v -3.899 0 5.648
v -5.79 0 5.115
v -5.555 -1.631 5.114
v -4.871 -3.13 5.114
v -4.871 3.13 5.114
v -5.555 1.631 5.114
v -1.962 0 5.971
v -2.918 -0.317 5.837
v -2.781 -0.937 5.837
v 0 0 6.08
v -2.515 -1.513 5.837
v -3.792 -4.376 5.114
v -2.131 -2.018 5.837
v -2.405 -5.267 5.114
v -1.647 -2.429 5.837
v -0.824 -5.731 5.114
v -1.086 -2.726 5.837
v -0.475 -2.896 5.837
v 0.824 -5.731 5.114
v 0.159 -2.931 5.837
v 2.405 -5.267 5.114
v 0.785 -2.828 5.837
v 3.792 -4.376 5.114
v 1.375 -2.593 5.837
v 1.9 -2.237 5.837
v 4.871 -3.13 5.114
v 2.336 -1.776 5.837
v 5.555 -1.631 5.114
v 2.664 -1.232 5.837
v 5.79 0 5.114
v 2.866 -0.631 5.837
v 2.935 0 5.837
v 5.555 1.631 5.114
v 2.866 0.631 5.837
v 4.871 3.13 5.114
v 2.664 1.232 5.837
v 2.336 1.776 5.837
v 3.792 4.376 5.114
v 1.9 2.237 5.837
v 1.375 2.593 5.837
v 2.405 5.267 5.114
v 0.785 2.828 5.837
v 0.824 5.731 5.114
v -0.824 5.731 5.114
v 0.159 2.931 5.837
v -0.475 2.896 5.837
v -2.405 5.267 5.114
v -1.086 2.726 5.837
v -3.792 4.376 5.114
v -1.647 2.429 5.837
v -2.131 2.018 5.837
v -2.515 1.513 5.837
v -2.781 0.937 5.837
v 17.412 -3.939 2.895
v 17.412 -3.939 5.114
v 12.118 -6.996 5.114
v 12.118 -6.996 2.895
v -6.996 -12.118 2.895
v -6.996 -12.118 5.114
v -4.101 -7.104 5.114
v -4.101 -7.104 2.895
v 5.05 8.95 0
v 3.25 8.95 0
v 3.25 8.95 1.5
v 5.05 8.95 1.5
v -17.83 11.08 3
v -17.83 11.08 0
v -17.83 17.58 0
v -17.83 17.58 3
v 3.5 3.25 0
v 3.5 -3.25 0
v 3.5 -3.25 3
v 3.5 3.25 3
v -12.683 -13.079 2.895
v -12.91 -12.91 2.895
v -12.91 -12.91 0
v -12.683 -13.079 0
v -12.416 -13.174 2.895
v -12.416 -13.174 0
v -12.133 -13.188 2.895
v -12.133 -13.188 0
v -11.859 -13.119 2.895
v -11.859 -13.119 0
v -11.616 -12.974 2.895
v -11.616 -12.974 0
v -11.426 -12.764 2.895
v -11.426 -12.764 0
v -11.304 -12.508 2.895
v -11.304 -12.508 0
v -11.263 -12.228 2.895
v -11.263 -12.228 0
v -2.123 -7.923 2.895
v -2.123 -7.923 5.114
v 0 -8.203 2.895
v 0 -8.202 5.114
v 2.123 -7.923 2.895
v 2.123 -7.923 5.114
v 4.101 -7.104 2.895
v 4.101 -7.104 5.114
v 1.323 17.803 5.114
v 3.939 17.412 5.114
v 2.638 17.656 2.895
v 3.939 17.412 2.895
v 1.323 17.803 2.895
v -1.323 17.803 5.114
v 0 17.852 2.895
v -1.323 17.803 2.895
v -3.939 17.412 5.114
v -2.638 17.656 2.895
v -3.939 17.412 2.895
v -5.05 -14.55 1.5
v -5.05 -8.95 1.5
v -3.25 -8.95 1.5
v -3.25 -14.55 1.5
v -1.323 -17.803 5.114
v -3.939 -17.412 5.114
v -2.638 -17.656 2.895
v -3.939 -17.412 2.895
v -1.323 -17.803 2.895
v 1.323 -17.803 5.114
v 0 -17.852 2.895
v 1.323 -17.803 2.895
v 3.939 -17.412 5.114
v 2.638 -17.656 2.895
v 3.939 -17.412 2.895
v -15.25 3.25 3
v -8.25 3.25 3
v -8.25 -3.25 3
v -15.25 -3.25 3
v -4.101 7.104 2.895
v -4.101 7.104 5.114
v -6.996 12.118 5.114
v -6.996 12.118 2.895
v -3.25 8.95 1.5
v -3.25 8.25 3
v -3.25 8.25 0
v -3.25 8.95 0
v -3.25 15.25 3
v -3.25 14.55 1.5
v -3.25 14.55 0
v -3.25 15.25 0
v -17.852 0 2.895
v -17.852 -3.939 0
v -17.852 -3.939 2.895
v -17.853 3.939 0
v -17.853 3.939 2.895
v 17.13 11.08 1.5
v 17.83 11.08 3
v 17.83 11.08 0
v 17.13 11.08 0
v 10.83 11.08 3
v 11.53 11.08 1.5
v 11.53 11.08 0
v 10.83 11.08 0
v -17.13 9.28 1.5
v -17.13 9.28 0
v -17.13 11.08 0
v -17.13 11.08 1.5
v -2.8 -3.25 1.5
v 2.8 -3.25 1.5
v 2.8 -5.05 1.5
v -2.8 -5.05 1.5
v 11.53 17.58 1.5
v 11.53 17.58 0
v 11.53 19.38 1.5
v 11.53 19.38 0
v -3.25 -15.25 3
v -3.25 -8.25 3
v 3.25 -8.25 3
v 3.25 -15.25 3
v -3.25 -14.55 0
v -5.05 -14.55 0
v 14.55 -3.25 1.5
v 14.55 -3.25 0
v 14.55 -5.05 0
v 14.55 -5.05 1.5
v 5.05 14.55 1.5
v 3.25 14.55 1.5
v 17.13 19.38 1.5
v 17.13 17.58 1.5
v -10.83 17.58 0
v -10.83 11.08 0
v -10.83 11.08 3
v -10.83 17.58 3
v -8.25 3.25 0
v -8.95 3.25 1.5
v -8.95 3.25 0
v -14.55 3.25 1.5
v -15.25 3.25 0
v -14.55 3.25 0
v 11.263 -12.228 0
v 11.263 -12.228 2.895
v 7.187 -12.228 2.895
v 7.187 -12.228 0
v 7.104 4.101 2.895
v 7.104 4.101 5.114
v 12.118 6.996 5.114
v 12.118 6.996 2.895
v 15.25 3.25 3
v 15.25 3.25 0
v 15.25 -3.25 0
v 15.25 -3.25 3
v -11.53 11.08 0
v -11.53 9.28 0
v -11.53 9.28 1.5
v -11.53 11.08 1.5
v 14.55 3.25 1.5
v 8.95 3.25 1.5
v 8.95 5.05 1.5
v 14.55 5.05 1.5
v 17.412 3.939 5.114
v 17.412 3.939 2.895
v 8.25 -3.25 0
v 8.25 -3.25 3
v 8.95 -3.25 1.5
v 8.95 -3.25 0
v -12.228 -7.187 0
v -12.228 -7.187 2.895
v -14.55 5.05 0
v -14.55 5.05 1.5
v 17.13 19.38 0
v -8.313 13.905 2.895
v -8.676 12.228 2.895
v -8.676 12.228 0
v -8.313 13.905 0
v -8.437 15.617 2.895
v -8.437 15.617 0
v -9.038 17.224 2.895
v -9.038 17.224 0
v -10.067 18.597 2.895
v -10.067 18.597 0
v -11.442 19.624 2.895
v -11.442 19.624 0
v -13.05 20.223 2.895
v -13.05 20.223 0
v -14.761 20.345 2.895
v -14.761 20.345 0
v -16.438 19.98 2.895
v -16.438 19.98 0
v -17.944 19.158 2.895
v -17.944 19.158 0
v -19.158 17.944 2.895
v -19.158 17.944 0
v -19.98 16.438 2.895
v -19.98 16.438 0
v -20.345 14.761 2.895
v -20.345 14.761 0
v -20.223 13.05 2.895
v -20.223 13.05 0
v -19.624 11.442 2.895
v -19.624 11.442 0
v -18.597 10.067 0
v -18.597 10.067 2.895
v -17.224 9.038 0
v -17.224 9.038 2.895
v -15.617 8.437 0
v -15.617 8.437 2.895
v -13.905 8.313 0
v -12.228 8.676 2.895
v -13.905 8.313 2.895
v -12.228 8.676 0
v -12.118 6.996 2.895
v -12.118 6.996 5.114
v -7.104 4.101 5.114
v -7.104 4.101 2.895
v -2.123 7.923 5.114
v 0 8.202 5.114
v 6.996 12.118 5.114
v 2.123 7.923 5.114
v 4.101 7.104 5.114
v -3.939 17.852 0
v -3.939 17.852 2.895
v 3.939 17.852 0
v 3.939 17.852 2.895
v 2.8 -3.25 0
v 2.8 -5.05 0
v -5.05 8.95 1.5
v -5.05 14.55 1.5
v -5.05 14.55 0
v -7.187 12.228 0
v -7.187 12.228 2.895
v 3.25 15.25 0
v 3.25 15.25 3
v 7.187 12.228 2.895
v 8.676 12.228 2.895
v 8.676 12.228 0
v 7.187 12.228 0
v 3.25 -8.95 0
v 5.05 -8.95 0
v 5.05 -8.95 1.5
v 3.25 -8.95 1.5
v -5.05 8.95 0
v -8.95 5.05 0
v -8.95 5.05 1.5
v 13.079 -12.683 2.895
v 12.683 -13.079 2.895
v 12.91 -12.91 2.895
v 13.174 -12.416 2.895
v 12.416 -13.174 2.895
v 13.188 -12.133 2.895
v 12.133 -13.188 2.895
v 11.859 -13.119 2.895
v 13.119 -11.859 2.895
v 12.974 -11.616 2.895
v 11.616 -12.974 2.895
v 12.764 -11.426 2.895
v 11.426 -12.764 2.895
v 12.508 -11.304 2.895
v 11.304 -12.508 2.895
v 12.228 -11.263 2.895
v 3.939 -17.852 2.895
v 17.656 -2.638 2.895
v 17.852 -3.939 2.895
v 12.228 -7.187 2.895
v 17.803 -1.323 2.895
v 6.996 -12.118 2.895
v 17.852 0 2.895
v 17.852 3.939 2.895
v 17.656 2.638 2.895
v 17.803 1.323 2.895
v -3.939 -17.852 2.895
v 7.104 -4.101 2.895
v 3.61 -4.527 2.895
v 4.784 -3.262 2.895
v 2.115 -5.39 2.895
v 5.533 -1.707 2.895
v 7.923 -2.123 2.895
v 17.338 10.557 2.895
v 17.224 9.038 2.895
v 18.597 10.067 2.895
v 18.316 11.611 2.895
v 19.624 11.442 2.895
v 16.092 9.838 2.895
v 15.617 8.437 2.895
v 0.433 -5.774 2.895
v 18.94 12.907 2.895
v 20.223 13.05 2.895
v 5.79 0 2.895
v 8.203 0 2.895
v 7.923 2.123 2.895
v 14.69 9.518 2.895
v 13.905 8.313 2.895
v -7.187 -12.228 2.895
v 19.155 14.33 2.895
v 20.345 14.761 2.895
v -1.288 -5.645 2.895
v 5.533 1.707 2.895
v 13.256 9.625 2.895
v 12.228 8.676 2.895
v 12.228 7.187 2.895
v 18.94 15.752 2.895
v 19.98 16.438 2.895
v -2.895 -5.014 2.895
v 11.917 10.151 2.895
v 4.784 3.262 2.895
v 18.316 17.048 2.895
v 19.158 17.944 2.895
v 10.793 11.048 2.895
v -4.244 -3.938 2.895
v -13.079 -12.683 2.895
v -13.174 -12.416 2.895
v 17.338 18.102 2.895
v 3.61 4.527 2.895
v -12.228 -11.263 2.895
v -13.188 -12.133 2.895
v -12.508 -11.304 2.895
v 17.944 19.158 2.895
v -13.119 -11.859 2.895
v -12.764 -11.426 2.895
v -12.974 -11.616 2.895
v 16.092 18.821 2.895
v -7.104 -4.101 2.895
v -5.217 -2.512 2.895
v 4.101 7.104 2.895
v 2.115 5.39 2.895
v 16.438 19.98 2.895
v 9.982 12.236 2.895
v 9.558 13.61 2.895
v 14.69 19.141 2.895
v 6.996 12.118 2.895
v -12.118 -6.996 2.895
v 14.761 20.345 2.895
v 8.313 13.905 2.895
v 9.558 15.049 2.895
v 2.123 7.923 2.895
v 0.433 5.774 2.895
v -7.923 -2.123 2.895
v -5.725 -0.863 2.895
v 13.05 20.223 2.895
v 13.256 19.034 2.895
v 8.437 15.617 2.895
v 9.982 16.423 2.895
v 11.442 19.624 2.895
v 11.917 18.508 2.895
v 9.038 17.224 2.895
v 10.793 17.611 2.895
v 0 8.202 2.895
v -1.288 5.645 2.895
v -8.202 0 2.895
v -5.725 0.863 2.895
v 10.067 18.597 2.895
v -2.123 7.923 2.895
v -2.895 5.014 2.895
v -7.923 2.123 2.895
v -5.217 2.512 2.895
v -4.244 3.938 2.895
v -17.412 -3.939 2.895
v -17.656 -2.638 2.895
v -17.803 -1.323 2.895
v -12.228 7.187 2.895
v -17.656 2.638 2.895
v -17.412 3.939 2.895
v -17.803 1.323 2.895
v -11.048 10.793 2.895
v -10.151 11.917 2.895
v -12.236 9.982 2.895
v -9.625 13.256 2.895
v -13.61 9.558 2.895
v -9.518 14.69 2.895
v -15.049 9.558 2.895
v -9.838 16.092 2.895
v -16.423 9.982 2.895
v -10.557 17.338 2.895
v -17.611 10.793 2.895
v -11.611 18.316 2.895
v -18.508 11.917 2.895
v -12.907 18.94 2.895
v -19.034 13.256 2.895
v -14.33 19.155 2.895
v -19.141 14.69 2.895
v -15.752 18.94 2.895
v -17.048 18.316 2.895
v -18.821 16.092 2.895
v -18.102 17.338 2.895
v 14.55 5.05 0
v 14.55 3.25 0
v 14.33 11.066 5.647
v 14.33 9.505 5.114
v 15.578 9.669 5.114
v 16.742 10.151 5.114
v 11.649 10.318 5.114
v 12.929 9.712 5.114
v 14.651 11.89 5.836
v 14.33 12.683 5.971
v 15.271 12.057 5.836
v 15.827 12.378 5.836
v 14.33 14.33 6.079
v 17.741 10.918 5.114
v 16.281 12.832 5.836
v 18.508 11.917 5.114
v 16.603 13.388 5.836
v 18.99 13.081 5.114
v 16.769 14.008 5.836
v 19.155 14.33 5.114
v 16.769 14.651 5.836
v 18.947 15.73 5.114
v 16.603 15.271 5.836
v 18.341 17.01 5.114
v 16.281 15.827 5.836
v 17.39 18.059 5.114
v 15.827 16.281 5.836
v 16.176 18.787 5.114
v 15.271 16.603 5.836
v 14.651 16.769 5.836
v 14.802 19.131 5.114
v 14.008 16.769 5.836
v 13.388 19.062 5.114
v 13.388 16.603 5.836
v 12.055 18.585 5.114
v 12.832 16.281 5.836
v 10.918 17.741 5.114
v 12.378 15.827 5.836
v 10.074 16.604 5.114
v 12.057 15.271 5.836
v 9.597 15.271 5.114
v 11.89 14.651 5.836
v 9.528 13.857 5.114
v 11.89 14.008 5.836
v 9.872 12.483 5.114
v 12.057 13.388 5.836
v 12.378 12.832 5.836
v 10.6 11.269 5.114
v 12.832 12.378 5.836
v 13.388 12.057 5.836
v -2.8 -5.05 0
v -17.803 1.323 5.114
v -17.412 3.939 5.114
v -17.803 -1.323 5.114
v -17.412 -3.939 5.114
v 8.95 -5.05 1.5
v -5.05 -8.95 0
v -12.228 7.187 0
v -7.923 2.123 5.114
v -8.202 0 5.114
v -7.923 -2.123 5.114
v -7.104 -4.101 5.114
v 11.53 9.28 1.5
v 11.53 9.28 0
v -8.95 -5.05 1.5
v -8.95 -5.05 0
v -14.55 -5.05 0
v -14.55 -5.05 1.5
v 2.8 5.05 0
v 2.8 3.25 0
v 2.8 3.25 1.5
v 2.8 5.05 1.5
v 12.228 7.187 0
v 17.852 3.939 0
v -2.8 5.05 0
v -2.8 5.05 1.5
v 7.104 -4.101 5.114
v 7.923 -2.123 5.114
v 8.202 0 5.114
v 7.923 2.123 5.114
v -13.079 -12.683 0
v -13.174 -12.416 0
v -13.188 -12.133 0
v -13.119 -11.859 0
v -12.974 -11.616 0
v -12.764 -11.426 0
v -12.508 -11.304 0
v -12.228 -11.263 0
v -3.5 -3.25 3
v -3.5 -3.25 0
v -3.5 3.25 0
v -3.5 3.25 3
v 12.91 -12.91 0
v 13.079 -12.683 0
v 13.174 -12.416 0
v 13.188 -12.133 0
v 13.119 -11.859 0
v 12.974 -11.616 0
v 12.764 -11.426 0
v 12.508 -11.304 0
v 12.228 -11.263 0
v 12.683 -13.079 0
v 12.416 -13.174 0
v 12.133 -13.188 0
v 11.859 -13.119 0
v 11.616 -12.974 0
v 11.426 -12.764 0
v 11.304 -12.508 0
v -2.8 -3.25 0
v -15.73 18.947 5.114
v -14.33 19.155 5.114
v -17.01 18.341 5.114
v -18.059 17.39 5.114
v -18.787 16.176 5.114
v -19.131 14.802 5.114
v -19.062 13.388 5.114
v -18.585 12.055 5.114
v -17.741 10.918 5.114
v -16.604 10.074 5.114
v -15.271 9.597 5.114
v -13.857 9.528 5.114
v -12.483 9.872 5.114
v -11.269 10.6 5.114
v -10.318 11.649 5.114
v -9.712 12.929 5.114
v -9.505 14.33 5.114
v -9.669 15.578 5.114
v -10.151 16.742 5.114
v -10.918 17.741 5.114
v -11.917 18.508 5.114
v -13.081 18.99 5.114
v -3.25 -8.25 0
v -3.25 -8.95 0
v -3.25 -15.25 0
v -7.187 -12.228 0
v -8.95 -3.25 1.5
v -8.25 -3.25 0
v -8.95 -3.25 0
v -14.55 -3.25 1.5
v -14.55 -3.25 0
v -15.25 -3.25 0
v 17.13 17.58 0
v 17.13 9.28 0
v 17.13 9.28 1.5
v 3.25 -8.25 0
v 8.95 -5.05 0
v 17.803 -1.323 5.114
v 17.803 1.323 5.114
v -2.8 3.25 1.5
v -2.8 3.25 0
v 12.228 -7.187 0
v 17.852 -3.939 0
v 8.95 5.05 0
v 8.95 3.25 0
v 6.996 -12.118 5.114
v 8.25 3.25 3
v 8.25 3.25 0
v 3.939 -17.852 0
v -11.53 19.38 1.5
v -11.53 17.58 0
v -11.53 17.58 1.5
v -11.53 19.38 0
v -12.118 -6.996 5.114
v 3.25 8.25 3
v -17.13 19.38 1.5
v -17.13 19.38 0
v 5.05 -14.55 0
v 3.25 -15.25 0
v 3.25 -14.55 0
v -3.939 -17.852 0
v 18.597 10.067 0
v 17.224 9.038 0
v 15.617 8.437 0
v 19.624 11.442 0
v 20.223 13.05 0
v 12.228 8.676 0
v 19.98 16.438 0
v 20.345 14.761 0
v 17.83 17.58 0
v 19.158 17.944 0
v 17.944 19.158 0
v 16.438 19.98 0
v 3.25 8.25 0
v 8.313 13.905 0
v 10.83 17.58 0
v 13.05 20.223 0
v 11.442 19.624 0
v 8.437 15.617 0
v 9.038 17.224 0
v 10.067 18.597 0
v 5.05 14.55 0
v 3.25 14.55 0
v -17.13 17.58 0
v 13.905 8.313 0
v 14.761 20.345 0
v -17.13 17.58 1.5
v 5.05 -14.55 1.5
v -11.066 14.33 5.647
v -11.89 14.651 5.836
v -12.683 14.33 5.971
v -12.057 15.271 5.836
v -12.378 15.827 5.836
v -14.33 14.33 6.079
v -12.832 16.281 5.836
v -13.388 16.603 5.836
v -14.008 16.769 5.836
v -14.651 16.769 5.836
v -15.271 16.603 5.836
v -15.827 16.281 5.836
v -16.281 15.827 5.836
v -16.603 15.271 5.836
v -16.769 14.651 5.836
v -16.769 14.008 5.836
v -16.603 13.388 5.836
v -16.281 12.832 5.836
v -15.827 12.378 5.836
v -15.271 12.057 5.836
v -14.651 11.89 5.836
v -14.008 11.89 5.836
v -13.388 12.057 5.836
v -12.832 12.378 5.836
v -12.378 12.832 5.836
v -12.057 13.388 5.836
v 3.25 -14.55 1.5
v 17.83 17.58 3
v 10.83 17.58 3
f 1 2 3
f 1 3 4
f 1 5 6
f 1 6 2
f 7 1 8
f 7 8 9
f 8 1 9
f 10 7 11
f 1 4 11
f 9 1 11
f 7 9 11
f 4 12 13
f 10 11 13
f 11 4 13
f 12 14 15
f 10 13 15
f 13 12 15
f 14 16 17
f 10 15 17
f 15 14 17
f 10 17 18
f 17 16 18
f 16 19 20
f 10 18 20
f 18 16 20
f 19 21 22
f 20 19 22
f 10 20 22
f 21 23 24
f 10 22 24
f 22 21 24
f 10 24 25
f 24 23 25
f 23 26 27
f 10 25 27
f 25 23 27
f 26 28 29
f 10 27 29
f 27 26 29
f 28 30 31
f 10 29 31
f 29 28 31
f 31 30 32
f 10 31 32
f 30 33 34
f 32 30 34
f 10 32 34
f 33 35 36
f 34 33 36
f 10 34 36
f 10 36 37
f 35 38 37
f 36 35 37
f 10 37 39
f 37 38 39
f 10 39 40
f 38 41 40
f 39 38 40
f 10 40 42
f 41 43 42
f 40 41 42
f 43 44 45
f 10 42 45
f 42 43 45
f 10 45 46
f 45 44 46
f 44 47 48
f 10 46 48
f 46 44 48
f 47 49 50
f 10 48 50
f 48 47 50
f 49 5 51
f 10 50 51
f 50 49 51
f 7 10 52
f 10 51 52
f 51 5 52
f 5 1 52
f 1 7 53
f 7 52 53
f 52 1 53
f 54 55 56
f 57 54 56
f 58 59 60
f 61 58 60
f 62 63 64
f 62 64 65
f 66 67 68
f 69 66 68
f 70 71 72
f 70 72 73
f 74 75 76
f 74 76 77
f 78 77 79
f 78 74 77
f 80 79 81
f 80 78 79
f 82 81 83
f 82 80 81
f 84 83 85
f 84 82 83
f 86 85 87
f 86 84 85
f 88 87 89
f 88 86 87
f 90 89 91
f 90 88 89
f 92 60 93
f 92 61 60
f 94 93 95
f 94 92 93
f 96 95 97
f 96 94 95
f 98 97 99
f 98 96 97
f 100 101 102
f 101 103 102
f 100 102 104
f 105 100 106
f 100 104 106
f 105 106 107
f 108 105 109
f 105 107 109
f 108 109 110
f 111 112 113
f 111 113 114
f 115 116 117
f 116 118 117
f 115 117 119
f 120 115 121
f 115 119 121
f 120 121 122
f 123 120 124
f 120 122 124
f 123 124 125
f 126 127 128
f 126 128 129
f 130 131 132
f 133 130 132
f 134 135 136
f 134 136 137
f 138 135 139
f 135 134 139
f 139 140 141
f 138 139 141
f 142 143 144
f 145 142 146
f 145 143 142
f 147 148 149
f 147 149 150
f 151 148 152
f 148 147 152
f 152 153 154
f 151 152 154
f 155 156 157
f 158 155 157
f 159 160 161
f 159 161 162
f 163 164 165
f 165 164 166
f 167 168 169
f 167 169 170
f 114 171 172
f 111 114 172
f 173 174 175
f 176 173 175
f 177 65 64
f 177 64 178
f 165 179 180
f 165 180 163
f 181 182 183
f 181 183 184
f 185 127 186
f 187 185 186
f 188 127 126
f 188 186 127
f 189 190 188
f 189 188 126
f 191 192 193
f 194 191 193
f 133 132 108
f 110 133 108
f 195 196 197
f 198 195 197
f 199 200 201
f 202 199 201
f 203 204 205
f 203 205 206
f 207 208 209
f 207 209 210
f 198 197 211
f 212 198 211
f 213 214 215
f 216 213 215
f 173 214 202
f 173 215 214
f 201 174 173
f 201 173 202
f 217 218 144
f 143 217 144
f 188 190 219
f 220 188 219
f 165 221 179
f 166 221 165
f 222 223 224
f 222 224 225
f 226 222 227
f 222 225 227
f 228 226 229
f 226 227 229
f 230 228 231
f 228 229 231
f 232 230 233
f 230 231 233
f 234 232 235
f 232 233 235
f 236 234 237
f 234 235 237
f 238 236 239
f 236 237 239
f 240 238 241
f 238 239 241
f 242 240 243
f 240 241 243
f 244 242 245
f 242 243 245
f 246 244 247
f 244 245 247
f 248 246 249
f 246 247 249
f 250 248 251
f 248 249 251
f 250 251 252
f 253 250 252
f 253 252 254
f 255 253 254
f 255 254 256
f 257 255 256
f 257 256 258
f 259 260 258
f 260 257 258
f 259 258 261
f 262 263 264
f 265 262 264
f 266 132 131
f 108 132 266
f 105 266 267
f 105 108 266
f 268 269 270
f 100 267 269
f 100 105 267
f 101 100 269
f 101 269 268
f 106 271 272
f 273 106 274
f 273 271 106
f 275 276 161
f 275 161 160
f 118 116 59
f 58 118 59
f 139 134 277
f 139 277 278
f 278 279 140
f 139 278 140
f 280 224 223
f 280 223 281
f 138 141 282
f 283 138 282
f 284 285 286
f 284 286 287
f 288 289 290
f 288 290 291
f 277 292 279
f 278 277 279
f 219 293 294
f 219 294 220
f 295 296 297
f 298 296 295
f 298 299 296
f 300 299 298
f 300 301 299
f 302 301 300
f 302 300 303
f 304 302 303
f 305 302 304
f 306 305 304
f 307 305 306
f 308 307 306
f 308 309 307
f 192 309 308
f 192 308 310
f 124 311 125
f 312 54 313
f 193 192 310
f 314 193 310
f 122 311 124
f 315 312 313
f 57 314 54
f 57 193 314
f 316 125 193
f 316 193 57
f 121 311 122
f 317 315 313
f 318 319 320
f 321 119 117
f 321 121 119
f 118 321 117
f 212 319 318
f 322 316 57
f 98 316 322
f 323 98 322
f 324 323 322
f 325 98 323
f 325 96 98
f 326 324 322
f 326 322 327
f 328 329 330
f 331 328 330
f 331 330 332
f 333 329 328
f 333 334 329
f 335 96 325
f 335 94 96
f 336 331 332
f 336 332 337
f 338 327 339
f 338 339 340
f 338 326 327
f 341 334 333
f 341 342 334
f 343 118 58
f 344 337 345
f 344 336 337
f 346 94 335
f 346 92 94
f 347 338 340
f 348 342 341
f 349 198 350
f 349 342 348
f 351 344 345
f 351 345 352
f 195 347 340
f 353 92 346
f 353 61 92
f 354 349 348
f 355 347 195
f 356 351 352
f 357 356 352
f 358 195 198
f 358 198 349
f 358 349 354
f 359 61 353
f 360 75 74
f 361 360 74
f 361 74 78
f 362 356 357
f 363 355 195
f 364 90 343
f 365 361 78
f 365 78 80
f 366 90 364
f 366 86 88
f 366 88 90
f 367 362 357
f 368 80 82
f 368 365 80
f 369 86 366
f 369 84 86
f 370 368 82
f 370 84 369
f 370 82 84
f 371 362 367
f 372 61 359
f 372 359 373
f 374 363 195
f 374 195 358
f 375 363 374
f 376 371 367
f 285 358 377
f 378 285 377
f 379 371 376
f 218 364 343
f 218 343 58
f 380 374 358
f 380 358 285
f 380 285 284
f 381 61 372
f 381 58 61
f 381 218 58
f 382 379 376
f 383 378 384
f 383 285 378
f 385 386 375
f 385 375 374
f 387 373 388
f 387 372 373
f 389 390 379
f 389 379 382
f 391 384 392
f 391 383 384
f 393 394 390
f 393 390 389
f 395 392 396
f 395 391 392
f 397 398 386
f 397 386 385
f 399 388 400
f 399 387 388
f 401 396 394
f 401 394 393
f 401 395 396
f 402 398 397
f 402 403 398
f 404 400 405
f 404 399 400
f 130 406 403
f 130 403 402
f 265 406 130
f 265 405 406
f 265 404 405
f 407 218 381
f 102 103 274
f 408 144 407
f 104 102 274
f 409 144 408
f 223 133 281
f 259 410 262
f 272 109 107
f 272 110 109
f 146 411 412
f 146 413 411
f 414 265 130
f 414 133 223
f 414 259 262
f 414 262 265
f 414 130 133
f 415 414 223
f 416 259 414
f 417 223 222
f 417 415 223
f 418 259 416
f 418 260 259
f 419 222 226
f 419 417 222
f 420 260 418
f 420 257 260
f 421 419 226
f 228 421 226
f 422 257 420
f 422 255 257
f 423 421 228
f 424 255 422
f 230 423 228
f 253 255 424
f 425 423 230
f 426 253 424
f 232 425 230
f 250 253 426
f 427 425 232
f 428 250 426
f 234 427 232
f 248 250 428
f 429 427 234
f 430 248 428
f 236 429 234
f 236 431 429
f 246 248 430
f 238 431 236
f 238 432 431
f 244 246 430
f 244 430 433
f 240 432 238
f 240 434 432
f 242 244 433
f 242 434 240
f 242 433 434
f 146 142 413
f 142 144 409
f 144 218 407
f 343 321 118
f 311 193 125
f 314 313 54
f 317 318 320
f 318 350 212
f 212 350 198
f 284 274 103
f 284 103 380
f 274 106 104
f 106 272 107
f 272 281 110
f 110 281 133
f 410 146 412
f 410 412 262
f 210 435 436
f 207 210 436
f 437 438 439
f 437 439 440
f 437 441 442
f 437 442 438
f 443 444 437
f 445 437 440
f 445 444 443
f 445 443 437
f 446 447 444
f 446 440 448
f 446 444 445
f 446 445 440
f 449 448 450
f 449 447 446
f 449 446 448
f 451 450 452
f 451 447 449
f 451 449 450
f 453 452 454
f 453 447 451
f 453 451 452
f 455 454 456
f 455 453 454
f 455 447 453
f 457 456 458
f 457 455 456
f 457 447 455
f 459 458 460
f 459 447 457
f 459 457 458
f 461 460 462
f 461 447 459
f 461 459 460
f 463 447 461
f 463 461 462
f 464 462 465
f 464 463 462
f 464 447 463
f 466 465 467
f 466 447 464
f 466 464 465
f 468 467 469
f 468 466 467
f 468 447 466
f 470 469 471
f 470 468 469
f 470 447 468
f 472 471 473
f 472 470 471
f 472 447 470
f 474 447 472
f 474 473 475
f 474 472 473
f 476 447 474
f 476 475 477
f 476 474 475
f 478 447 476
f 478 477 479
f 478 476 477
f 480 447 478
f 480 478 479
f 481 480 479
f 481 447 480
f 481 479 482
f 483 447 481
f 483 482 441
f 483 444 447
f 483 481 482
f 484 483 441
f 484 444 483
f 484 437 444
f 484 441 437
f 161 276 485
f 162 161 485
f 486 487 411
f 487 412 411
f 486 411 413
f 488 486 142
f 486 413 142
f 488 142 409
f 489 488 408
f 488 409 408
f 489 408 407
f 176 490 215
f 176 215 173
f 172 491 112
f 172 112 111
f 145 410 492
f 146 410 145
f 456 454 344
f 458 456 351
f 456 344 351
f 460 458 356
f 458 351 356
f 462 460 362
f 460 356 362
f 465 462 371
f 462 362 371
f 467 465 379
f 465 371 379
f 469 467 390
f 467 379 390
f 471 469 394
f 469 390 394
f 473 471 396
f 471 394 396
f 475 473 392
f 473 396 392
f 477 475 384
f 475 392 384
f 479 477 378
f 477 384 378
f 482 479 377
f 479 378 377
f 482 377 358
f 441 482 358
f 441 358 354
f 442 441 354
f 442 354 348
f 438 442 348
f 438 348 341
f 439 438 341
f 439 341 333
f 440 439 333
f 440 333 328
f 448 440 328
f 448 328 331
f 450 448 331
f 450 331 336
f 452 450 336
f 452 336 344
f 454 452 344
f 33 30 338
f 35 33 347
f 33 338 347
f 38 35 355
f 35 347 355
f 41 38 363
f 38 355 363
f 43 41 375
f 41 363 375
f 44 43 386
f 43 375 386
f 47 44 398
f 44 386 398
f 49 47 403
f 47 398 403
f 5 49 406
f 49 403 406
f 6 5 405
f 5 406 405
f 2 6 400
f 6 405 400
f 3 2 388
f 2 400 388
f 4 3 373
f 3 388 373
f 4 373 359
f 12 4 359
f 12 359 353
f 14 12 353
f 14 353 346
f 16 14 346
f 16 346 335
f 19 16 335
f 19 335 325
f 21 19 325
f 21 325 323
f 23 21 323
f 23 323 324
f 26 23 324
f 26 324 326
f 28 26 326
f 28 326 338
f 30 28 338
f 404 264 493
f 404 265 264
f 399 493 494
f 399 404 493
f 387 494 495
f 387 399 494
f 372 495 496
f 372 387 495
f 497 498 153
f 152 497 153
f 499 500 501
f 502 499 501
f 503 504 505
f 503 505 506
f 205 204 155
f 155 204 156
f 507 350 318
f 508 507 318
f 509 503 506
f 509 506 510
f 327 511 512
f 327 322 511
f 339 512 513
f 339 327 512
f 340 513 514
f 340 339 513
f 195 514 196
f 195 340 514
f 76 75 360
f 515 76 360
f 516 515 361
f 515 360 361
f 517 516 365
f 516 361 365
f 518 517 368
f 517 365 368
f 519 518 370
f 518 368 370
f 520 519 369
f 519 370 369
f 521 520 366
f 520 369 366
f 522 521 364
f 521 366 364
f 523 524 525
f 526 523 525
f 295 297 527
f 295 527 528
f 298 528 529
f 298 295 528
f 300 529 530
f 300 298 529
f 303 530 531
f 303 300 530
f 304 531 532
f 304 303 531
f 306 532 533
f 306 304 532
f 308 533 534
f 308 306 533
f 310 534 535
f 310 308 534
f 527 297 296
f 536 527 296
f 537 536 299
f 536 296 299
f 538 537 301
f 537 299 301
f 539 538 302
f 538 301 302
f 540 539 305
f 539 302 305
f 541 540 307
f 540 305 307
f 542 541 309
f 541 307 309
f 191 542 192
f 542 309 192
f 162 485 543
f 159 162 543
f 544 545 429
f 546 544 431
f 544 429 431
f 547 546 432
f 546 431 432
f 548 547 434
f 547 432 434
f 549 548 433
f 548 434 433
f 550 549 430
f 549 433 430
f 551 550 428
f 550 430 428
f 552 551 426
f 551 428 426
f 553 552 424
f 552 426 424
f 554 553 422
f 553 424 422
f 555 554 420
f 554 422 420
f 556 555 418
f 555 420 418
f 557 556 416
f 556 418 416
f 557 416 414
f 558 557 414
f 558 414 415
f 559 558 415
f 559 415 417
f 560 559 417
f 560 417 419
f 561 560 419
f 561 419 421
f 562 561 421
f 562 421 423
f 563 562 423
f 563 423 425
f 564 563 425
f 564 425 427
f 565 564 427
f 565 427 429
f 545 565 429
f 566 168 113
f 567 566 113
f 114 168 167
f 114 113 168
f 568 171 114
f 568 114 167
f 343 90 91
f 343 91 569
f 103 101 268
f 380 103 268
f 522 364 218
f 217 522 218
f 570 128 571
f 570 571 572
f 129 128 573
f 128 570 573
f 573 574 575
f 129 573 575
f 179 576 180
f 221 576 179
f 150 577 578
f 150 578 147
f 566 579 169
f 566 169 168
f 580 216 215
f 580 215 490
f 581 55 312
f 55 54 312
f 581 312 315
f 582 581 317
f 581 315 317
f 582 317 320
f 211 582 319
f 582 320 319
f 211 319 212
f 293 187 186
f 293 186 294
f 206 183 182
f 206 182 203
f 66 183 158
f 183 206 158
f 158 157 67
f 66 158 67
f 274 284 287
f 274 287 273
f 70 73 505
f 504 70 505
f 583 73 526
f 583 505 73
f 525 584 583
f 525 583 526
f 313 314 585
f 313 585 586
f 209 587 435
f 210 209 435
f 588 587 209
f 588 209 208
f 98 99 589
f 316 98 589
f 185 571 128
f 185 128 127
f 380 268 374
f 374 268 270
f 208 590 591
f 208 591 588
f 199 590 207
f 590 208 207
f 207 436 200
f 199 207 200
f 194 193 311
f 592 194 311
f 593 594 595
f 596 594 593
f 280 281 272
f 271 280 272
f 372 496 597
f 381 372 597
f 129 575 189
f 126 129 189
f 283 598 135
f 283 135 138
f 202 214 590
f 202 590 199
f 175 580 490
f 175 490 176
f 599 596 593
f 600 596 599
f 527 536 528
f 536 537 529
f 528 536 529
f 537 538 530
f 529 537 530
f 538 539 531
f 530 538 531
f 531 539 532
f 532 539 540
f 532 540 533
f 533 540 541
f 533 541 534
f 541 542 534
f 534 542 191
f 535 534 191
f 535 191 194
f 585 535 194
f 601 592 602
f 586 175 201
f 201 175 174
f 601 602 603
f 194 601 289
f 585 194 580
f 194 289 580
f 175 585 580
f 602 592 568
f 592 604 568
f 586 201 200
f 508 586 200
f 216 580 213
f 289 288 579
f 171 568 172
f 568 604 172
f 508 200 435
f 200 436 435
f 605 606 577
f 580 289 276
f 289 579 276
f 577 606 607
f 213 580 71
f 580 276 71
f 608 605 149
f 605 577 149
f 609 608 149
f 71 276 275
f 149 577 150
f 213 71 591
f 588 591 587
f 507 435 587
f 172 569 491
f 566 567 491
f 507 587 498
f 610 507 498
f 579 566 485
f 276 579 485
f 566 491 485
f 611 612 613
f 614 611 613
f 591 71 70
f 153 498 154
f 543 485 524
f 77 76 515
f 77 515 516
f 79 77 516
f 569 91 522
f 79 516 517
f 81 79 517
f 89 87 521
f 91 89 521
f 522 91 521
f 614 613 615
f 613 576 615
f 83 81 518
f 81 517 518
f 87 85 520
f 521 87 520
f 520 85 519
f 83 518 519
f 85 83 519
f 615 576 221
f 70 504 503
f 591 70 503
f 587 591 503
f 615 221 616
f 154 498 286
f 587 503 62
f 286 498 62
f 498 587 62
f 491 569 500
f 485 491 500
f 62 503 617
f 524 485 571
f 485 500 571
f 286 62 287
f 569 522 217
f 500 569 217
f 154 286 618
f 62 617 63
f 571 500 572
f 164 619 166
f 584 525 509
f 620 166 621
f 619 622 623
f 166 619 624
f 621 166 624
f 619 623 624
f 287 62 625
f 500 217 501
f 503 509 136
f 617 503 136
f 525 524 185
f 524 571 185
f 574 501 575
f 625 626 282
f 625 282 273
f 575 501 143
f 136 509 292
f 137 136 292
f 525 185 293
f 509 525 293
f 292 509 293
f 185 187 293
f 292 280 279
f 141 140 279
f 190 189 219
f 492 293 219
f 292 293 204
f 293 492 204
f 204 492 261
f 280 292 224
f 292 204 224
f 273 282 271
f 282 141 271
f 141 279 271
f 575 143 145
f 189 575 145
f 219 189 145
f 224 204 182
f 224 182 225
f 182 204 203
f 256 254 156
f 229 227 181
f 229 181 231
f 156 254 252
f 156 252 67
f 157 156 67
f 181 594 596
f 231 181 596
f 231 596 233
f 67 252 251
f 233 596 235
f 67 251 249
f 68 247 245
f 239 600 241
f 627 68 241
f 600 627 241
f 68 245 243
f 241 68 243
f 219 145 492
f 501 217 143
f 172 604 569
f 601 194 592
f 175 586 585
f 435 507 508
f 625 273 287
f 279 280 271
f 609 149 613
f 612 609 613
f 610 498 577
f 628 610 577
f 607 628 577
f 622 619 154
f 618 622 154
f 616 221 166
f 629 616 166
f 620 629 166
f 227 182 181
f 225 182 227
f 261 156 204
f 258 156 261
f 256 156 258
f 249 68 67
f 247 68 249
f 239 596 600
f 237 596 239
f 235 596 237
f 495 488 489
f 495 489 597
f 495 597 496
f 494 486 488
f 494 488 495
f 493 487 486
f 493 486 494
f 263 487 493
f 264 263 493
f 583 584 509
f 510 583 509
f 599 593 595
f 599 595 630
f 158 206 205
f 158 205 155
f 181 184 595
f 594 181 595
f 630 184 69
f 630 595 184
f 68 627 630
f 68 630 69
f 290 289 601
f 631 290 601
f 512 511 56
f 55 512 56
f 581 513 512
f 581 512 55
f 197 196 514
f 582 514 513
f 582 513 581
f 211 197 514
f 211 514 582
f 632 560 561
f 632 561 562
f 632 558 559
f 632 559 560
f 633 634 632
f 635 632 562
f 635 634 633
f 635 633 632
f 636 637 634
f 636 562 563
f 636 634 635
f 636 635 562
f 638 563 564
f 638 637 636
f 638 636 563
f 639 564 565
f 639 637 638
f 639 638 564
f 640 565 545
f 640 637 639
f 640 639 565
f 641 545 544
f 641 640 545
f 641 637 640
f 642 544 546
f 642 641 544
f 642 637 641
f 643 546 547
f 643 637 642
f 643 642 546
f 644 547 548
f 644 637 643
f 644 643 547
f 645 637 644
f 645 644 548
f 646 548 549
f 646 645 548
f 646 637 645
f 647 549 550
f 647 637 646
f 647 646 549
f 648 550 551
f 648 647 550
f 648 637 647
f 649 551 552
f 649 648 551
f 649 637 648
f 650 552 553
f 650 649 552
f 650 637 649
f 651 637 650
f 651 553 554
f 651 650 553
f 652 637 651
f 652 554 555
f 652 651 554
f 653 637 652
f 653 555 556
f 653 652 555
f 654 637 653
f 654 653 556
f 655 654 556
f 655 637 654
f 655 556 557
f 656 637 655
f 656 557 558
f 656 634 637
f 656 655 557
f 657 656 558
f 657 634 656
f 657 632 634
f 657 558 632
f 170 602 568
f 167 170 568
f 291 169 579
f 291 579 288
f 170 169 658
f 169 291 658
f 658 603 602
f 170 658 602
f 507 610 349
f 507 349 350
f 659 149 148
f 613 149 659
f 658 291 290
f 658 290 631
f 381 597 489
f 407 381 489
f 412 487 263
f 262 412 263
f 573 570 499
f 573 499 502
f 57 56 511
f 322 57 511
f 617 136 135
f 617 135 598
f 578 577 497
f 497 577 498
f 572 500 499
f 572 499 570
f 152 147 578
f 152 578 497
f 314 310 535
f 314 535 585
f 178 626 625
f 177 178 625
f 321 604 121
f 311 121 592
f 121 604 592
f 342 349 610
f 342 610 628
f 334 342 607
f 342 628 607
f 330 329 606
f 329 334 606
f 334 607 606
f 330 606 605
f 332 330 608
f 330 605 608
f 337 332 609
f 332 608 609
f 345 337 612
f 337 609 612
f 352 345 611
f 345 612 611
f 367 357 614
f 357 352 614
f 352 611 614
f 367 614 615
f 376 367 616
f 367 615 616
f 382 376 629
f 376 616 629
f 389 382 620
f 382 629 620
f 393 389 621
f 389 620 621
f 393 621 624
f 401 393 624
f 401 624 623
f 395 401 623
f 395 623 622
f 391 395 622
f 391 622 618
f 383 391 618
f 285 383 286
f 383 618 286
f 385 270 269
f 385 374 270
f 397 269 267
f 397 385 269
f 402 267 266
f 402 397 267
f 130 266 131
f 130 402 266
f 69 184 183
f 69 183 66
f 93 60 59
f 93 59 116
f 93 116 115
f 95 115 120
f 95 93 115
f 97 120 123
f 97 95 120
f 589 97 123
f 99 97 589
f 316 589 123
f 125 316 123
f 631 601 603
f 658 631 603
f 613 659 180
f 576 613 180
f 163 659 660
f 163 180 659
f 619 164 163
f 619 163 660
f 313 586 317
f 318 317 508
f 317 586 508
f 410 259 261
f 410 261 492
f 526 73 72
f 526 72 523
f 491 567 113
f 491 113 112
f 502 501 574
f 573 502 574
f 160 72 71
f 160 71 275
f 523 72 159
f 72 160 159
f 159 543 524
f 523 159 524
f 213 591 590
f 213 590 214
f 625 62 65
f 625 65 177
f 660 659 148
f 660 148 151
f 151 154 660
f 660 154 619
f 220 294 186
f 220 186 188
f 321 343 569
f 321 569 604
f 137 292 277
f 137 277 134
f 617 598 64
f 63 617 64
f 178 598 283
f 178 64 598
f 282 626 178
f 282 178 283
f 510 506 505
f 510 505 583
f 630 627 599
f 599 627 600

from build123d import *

# Parameters (mm, degrees)
SKETCH2_W            = 37
SKETCH2_H            = 37
BOSS_EXTRUDE1_DEPTH  = 3
SKETCH3_R            = 6
BOSS_EXTRUDE2_DEPTH  = 2.3
SKETCH6_R            = 18.5
SKETCH6_R_2          = 8.5
BOSS_EXTRUDE3_DEPTH  = 2.3
CUT_EXTRUDE2_DEPTH   = 2.3
CIRPATTERN1_COUNT    = 4
CUT_EXTRUDE3_DEPTH   = 2.3
CIRPATTERN2_COUNT    = 4
CUT_EXTRUDE5_DEPTH   = 3
CIRPATTERN7_COUNT    = 4
MIRROR2_COPY_1_DEPTH = 3
MIRROR2_COPY_2_DEPTH = 3
MIRROR2_COPY_3_DEPTH = 3
SKETCH11_R           = 6.25
BOSS_EXTRUDE4_DEPTH  = 3
CIRPATTERN9_COUNT    = 2
CIRPATTERN9_ANGLE    = 90
SKETCH12_R           = 5
BOSS_EXTRUDE5_DEPTH  = 2.3
CIRPATTERN10_COUNT   = 2
CIRPATTERN10_ANGLE   = 90
CIRPATTERN11_COUNT   = 2
CIRPATTERN11_ANGLE   = 90
SCALE1_SCALE         = 0.965
SKETCH19_W           = 7
SKETCH19_H           = 6.5
CUT_EXTRUDE6_DEPTH   = 3
SKETCH20_W           = 5.6
SKETCH20_H           = 1.8
CUT_EXTRUDE7_DEPTH   = 1.5
SKETCH28_W           = 7
SKETCH28_H           = 6.5
CUT_EXTRUDE10_DEPTH  = 3
SKETCH30_W           = 5.6
SKETCH30_H           = 1.8
CUT_EXTRUDE11_DEPTH  = 1.5
CIRPATTERN12_COUNT   = 4
SKETCH33_W           = 7
SKETCH33_H           = 6.5
CUT_EXTRUDE12_DEPTH  = 3
SKETCH35_W           = 5.6
SKETCH35_H           = 1.8
CUT_EXTRUDE13_DEPTH  = 1.5
SKETCH37_W           = 7
SKETCH37_H           = 6.5
CUT_EXTRUDE14_DEPTH  = 3
SKETCH39_W           = 5.6
SKETCH39_H           = 1.8
CUT_EXTRUDE15_DEPTH  = 1.5


with BuildPart() as part:
    # Sketch2 → Boss-Extrude1 (new body)
    with BuildSketch(Plane.XY):
        Rectangle(SKETCH2_W, SKETCH2_H)
    extrude(amount=BOSS_EXTRUDE1_DEPTH)

    # Sketch3 → Boss-Extrude2 (add)
    with BuildSketch(Plane.XY.offset(3)):
        Circle(SKETCH3_R)
    extrude(amount=BOSS_EXTRUDE2_DEPTH)

    # Sketch5 → Revolve1 (revolve)
    with BuildSketch(Plane(origin=(0, 0, 0), x_dir=(-1, 0, 0), z_dir=(0, -1, 0))):
        with BuildLine():
            Line((6, -5.3), (0, -5.3))
            Line((0, -5.3), (0, -6.3))
            ThreePointArc((0, -6.3), (3.041381265, -6.048287591), (6, -5.3))
        make_face()
    revolve(axis=Axis((0, 0, 5.3), (0, 0, 1)))

    # Sketch6 → Boss-Extrude3 (add)
    with BuildSketch(Plane.XY.offset(3)):
        Circle(SKETCH6_R)
        Circle(SKETCH6_R_2, mode=Mode.SUBTRACT)
    extrude(amount=BOSS_EXTRUDE3_DEPTH)

    # Sketch8 → Cut-Extrude2 (cut)
    with BuildSketch(Plane.XY.offset(5.3)):
        with BuildLine():
            ThreePointArc((4.25, 7.361215932), (6.01040764, 6.01040764), (7.361215932, 4.25))
            Line((7.361215932, 4.25), (16.02146997, 9.25))
            ThreePointArc((16.02146997, 9.25), (13.081475452, 13.081475452), (9.25, 16.02146997))
            Line((9.25, 16.02146997), (4.25, 7.361215932))
        make_face()
    cut_extrude2 = extrude(amount=-CUT_EXTRUDE2_DEPTH, mode=Mode.SUBTRACT)

    # CirPattern1: Cut-Extrude2 ×4 about axis
    cirpattern1_axis = Axis((0, 0, 5.3), (0, 0, 1))
    for i in range(1, CIRPATTERN1_COUNT):
        add(cut_extrude2.rotate(cirpattern1_axis, i * 360 / CIRPATTERN1_COUNT), mode=Mode.SUBTRACT)

    # Sketch9 → Cut-Extrude3 (cut)
    with BuildSketch(Plane.XY.offset(5.3)):
        with BuildLine():
            Line((16.02146997, 9.25), (12.557368355, 7.25))
            Line((12.557368355, 7.25), (18.043966792, 4.082310915))
            ThreePointArc((18.043966792, 4.082310915), (17.227586832, 6.742421815), (16.02146997, 9.25))
        make_face()
        with BuildLine():
            Line((18.043966792, -4.082310915), (12.557368355, -7.25))
            Line((12.557368355, -7.25), (16.02146997, -9.25))
            ThreePointArc((16.02146997, -9.25), (17.227586832, -6.742421815), (18.043966792, -4.082310915))
        make_face()
    cut_extrude3 = extrude(amount=-CUT_EXTRUDE3_DEPTH, mode=Mode.SUBTRACT)

    # CirPattern2: Cut-Extrude3 ×4 about axis
    cirpattern2_axis = Axis((0, 0, 0), (0, 0, 1))
    for i in range(1, CIRPATTERN2_COUNT):
        add(cut_extrude3.rotate(cirpattern2_axis, i * 360 / CIRPATTERN2_COUNT), mode=Mode.SUBTRACT)

    # Sketch10 → Cut-Extrude5 (cut)
    with BuildSketch(Plane.XY.offset(3)):
        with BuildLine():
            Line((7.447468172, -12.671376657), (4.082310915, -18.5))
            Line((4.082310915, -18.5), (18.5, -18.5))
            Line((18.5, -18.5), (13.378483438, -13.378483438))
            ThreePointArc((13.378483438, -13.378483438), (12.288693225, -13.595256189), (11.671376657, -12.671376657))
            Line((11.671376657, -12.671376657), (7.447468172, -12.671376657))
        make_face()
    cut_extrude5 = extrude(amount=-CUT_EXTRUDE5_DEPTH, mode=Mode.SUBTRACT)

    # CirPattern7: Cut-Extrude5 ×4 about axis
    cirpattern7_axis = Axis((0, 0, 0), (0, 0, 1))
    for i in range(1, CIRPATTERN7_COUNT):
        add(cut_extrude5.rotate(cirpattern7_axis, i * 360 / CIRPATTERN7_COUNT), mode=Mode.SUBTRACT)

    # Mirror2: Cut-Extrude5 across plane
    add(cut_extrude5.mirror(Plane(origin=(0, 0, 0), x_dir=(0, 0, 1), z_dir=(0.707106781, -0.707106781, 0))), mode=Mode.SUBTRACT)

    # Mirror2 copy 1 sketch → Mirror2 copy 1 (cut)
    with BuildSketch(Plane.XY.offset(3)):
        with BuildLine():
            Line((7.447468172, 12.671376657), (4.082310915, 18.5))
            Line((4.082310915, 18.5), (18.5, 18.5))
            Line((18.5, 18.5), (13.378483438, 13.378483438))
            ThreePointArc((13.378483438, 13.378483438), (12.288693225, 13.595256189), (11.671376657, 12.671376657))
            Line((11.671376657, 12.671376657), (7.447468172, 12.671376657))
        make_face()
    extrude(amount=-MIRROR2_COPY_1_DEPTH, mode=Mode.SUBTRACT)

    # Mirror2 copy 2 sketch → Mirror2 copy 2 (cut)
    with BuildSketch(Plane(origin=(0, 0, 3), x_dir=(0, -1, 0), z_dir=(0, 0, 1))):
        with BuildLine():
            Line((7.447468172, 12.671376657), (4.082310915, 18.5))
            Line((4.082310915, 18.5), (18.5, 18.5))
            Line((18.5, 18.5), (13.378483438, 13.378483438))
            ThreePointArc((13.378483438, 13.378483438), (12.288693225, 13.595256189), (11.671376657, 12.671376657))
            Line((11.671376657, 12.671376657), (7.447468172, 12.671376657))
        make_face()
    extrude(amount=-MIRROR2_COPY_2_DEPTH, mode=Mode.SUBTRACT)

    # Mirror2 copy 3 sketch → Mirror2 copy 3 (cut)
    with BuildSketch(Plane(origin=(0, 0, 3), x_dir=(-1, 0, 0), z_dir=(0, 0, 1))):
        with BuildLine():
            Line((7.447468172, 12.671376657), (4.082310915, 18.5))
            Line((4.082310915, 18.5), (18.5, 18.5))
            Line((18.5, 18.5), (13.378483438, 13.378483438))
            ThreePointArc((13.378483438, 13.378483438), (12.288693225, 13.595256189), (11.671376657, 12.671376657))
            Line((11.671376657, 12.671376657), (7.447468172, 12.671376657))
        make_face()
    extrude(amount=-MIRROR2_COPY_3_DEPTH, mode=Mode.SUBTRACT)

    # Sketch11 → Boss-Extrude4 (add)
    with BuildSketch(Plane.XY):
        with Locations((14.849242405, 14.849242405)):
            Circle(SKETCH11_R)
    boss_extrude4 = extrude(amount=BOSS_EXTRUDE4_DEPTH)

    # CirPattern9: Boss-Extrude4 ×2 about axis
    cirpattern9_axis = Axis((0, 0, 5.3), (0, 0, 1))
    for i in range(1, CIRPATTERN9_COUNT):
        add(boss_extrude4.rotate(cirpattern9_axis, i * CIRPATTERN9_ANGLE / (CIRPATTERN9_COUNT - 1)))

    # Sketch12 → Boss-Extrude5 (add)
    with BuildSketch(Plane.XY.offset(3)):
        with Locations((14.849242405, 14.849242405)):
            Circle(SKETCH12_R)
    boss_extrude5 = extrude(amount=BOSS_EXTRUDE5_DEPTH)

    # Sketch14 → Revolve2 (revolve)
    with BuildSketch(Plane(origin=(14.849242405, 0, 0), x_dir=(0, 0, -1), z_dir=(1, 0, 0))):
        with BuildLine():
            Line((-6.3, 14.849242405), (-5.3, 14.849242405))
            Line((-5.3, 14.849242405), (-5.3, 9.849242405))
            ThreePointArc((-5.3, 9.849242405), (-6.047548784, 12.299732648), (-6.3, 14.849242405))
        make_face()
    revolve2 = revolve(axis=Axis((14.849242405, 14.849242405, 5.3), (0, 0, 1)))

    # CirPattern10: Boss-Extrude5 ×2 about axis
    cirpattern10_axis = Axis((0, 0, 5.3), (0, 0, 1))
    for i in range(1, CIRPATTERN10_COUNT):
        add(boss_extrude5.rotate(cirpattern10_axis, i * CIRPATTERN10_ANGLE / (CIRPATTERN10_COUNT - 1)))

    # CirPattern11: Revolve2 ×2 about axis
    cirpattern11_axis = Axis((0, 0, 5.3), (0, 0, 1))
    for i in range(1, CIRPATTERN11_COUNT):
        add(revolve2.rotate(cirpattern11_axis, i * CIRPATTERN11_ANGLE / (CIRPATTERN11_COUNT - 1)))


with BuildPart() as part_1:
    # Scale1: scaled about (0, 0, 0)
    add(part.part.scale(SCALE1_SCALE))

    # Sketch19 → Cut-Extrude6 (cut)
    with BuildSketch(Plane(origin=(0, 0, 0), x_dir=(-1, 0, 0), z_dir=(0, 0, -1))):
        Rectangle(SKETCH19_W, SKETCH19_H)
    extrude(amount=-CUT_EXTRUDE6_DEPTH, mode=Mode.SUBTRACT)

    # Sketch20 → Cut-Extrude7 (cut)
    with BuildSketch(Plane(origin=(0, 0, 0), x_dir=(-1, 0, 0), z_dir=(0, 0, -1))):
        with Locations((0, 4.15)):
            Rectangle(SKETCH20_W, SKETCH20_H)
        with Locations((0, -4.15)):
            Rectangle(SKETCH20_W, SKETCH20_H)
    extrude(amount=-CUT_EXTRUDE7_DEPTH, mode=Mode.SUBTRACT)

    # Sketch28 → Cut-Extrude10 (cut)
    with BuildSketch(Plane(origin=(-9.998493026, 1.351076982, 0), x_dir=(-1, 0, 0), z_dir=(0, 0, -1))):
        with Locations((1.751506974, -1.351076982)):
            Rectangle(SKETCH28_W, SKETCH28_H)
    cut_extrude10 = extrude(amount=-CUT_EXTRUDE10_DEPTH, mode=Mode.SUBTRACT)

    # Sketch30 → Cut-Extrude11 (cut)
    with BuildSketch(Plane(origin=(-9.998493026, 1.351076982, 0), x_dir=(-1, 0, 0), z_dir=(0, 0, -1))):
        with Locations((1.751506974, 2.798923018)):
            Rectangle(SKETCH30_W, SKETCH30_H)
        with Locations((1.751506974, -5.501076982)):
            Rectangle(SKETCH30_W, SKETCH30_H)
    cut_extrude11 = extrude(amount=-CUT_EXTRUDE11_DEPTH, mode=Mode.SUBTRACT)

    # CirPattern12: Cut-Extrude10, Cut-Extrude11 ×4 about axis
    cirpattern12_axis = Axis((0, 0, 0), (0, 0, 1))
    for i in range(1, CIRPATTERN12_COUNT):
        add(cut_extrude10.rotate(cirpattern12_axis, i * 360 / CIRPATTERN12_COUNT), mode=Mode.SUBTRACT)
        add(cut_extrude11.rotate(cirpattern12_axis, i * 360 / CIRPATTERN12_COUNT), mode=Mode.SUBTRACT)

    # Sketch33 → Cut-Extrude12 (cut)
    with BuildSketch(Plane(origin=(-14.368957264, 14.283753363, 0), x_dir=(-1, 0, 0), z_dir=(0, 0, -1))):
        with Locations((-0.039438343, 0.045765558)):
            Rectangle(SKETCH33_W, SKETCH33_H)
    extrude(amount=-CUT_EXTRUDE12_DEPTH, mode=Mode.SUBTRACT)

    # Sketch35 → Cut-Extrude13 (cut)
    with BuildSketch(Plane(origin=(-14.368957264, 14.283753363, 0), x_dir=(-1, 0, 0), z_dir=(0, 0, -1))):
        with Locations((-0.039438343, 4.195765558)):
            Rectangle(SKETCH35_W, SKETCH35_H)
        with Locations((-0.039438343, -4.104234442)):
            Rectangle(SKETCH35_W, SKETCH35_H)
    extrude(amount=-CUT_EXTRUDE13_DEPTH, mode=Mode.SUBTRACT)

    # Sketch37 → Cut-Extrude14 (cut)
    with BuildSketch(Plane(origin=(13.371321797, 14.128872217, 0), x_dir=(-1, 0, 0), z_dir=(0, 0, -1))):
        with Locations((-0.958197123, 0.200646703)):
            Rectangle(SKETCH37_W, SKETCH37_H)
    extrude(amount=-CUT_EXTRUDE14_DEPTH, mode=Mode.SUBTRACT)

    # Sketch39 → Cut-Extrude15 (cut)
    with BuildSketch(Plane(origin=(13.371321797, 14.128872217, 0), x_dir=(-1, 0, 0), z_dir=(0, 0, -1))):
        with Locations((-0.958197123, 4.350646703)):
            Rectangle(SKETCH39_W, SKETCH39_H)
        with Locations((-0.958197123, -3.949353297)):
            Rectangle(SKETCH39_W, SKETCH39_H)
    extrude(amount=-CUT_EXTRUDE15_DEPTH, mode=Mode.SUBTRACT)


solid = part_1.part
